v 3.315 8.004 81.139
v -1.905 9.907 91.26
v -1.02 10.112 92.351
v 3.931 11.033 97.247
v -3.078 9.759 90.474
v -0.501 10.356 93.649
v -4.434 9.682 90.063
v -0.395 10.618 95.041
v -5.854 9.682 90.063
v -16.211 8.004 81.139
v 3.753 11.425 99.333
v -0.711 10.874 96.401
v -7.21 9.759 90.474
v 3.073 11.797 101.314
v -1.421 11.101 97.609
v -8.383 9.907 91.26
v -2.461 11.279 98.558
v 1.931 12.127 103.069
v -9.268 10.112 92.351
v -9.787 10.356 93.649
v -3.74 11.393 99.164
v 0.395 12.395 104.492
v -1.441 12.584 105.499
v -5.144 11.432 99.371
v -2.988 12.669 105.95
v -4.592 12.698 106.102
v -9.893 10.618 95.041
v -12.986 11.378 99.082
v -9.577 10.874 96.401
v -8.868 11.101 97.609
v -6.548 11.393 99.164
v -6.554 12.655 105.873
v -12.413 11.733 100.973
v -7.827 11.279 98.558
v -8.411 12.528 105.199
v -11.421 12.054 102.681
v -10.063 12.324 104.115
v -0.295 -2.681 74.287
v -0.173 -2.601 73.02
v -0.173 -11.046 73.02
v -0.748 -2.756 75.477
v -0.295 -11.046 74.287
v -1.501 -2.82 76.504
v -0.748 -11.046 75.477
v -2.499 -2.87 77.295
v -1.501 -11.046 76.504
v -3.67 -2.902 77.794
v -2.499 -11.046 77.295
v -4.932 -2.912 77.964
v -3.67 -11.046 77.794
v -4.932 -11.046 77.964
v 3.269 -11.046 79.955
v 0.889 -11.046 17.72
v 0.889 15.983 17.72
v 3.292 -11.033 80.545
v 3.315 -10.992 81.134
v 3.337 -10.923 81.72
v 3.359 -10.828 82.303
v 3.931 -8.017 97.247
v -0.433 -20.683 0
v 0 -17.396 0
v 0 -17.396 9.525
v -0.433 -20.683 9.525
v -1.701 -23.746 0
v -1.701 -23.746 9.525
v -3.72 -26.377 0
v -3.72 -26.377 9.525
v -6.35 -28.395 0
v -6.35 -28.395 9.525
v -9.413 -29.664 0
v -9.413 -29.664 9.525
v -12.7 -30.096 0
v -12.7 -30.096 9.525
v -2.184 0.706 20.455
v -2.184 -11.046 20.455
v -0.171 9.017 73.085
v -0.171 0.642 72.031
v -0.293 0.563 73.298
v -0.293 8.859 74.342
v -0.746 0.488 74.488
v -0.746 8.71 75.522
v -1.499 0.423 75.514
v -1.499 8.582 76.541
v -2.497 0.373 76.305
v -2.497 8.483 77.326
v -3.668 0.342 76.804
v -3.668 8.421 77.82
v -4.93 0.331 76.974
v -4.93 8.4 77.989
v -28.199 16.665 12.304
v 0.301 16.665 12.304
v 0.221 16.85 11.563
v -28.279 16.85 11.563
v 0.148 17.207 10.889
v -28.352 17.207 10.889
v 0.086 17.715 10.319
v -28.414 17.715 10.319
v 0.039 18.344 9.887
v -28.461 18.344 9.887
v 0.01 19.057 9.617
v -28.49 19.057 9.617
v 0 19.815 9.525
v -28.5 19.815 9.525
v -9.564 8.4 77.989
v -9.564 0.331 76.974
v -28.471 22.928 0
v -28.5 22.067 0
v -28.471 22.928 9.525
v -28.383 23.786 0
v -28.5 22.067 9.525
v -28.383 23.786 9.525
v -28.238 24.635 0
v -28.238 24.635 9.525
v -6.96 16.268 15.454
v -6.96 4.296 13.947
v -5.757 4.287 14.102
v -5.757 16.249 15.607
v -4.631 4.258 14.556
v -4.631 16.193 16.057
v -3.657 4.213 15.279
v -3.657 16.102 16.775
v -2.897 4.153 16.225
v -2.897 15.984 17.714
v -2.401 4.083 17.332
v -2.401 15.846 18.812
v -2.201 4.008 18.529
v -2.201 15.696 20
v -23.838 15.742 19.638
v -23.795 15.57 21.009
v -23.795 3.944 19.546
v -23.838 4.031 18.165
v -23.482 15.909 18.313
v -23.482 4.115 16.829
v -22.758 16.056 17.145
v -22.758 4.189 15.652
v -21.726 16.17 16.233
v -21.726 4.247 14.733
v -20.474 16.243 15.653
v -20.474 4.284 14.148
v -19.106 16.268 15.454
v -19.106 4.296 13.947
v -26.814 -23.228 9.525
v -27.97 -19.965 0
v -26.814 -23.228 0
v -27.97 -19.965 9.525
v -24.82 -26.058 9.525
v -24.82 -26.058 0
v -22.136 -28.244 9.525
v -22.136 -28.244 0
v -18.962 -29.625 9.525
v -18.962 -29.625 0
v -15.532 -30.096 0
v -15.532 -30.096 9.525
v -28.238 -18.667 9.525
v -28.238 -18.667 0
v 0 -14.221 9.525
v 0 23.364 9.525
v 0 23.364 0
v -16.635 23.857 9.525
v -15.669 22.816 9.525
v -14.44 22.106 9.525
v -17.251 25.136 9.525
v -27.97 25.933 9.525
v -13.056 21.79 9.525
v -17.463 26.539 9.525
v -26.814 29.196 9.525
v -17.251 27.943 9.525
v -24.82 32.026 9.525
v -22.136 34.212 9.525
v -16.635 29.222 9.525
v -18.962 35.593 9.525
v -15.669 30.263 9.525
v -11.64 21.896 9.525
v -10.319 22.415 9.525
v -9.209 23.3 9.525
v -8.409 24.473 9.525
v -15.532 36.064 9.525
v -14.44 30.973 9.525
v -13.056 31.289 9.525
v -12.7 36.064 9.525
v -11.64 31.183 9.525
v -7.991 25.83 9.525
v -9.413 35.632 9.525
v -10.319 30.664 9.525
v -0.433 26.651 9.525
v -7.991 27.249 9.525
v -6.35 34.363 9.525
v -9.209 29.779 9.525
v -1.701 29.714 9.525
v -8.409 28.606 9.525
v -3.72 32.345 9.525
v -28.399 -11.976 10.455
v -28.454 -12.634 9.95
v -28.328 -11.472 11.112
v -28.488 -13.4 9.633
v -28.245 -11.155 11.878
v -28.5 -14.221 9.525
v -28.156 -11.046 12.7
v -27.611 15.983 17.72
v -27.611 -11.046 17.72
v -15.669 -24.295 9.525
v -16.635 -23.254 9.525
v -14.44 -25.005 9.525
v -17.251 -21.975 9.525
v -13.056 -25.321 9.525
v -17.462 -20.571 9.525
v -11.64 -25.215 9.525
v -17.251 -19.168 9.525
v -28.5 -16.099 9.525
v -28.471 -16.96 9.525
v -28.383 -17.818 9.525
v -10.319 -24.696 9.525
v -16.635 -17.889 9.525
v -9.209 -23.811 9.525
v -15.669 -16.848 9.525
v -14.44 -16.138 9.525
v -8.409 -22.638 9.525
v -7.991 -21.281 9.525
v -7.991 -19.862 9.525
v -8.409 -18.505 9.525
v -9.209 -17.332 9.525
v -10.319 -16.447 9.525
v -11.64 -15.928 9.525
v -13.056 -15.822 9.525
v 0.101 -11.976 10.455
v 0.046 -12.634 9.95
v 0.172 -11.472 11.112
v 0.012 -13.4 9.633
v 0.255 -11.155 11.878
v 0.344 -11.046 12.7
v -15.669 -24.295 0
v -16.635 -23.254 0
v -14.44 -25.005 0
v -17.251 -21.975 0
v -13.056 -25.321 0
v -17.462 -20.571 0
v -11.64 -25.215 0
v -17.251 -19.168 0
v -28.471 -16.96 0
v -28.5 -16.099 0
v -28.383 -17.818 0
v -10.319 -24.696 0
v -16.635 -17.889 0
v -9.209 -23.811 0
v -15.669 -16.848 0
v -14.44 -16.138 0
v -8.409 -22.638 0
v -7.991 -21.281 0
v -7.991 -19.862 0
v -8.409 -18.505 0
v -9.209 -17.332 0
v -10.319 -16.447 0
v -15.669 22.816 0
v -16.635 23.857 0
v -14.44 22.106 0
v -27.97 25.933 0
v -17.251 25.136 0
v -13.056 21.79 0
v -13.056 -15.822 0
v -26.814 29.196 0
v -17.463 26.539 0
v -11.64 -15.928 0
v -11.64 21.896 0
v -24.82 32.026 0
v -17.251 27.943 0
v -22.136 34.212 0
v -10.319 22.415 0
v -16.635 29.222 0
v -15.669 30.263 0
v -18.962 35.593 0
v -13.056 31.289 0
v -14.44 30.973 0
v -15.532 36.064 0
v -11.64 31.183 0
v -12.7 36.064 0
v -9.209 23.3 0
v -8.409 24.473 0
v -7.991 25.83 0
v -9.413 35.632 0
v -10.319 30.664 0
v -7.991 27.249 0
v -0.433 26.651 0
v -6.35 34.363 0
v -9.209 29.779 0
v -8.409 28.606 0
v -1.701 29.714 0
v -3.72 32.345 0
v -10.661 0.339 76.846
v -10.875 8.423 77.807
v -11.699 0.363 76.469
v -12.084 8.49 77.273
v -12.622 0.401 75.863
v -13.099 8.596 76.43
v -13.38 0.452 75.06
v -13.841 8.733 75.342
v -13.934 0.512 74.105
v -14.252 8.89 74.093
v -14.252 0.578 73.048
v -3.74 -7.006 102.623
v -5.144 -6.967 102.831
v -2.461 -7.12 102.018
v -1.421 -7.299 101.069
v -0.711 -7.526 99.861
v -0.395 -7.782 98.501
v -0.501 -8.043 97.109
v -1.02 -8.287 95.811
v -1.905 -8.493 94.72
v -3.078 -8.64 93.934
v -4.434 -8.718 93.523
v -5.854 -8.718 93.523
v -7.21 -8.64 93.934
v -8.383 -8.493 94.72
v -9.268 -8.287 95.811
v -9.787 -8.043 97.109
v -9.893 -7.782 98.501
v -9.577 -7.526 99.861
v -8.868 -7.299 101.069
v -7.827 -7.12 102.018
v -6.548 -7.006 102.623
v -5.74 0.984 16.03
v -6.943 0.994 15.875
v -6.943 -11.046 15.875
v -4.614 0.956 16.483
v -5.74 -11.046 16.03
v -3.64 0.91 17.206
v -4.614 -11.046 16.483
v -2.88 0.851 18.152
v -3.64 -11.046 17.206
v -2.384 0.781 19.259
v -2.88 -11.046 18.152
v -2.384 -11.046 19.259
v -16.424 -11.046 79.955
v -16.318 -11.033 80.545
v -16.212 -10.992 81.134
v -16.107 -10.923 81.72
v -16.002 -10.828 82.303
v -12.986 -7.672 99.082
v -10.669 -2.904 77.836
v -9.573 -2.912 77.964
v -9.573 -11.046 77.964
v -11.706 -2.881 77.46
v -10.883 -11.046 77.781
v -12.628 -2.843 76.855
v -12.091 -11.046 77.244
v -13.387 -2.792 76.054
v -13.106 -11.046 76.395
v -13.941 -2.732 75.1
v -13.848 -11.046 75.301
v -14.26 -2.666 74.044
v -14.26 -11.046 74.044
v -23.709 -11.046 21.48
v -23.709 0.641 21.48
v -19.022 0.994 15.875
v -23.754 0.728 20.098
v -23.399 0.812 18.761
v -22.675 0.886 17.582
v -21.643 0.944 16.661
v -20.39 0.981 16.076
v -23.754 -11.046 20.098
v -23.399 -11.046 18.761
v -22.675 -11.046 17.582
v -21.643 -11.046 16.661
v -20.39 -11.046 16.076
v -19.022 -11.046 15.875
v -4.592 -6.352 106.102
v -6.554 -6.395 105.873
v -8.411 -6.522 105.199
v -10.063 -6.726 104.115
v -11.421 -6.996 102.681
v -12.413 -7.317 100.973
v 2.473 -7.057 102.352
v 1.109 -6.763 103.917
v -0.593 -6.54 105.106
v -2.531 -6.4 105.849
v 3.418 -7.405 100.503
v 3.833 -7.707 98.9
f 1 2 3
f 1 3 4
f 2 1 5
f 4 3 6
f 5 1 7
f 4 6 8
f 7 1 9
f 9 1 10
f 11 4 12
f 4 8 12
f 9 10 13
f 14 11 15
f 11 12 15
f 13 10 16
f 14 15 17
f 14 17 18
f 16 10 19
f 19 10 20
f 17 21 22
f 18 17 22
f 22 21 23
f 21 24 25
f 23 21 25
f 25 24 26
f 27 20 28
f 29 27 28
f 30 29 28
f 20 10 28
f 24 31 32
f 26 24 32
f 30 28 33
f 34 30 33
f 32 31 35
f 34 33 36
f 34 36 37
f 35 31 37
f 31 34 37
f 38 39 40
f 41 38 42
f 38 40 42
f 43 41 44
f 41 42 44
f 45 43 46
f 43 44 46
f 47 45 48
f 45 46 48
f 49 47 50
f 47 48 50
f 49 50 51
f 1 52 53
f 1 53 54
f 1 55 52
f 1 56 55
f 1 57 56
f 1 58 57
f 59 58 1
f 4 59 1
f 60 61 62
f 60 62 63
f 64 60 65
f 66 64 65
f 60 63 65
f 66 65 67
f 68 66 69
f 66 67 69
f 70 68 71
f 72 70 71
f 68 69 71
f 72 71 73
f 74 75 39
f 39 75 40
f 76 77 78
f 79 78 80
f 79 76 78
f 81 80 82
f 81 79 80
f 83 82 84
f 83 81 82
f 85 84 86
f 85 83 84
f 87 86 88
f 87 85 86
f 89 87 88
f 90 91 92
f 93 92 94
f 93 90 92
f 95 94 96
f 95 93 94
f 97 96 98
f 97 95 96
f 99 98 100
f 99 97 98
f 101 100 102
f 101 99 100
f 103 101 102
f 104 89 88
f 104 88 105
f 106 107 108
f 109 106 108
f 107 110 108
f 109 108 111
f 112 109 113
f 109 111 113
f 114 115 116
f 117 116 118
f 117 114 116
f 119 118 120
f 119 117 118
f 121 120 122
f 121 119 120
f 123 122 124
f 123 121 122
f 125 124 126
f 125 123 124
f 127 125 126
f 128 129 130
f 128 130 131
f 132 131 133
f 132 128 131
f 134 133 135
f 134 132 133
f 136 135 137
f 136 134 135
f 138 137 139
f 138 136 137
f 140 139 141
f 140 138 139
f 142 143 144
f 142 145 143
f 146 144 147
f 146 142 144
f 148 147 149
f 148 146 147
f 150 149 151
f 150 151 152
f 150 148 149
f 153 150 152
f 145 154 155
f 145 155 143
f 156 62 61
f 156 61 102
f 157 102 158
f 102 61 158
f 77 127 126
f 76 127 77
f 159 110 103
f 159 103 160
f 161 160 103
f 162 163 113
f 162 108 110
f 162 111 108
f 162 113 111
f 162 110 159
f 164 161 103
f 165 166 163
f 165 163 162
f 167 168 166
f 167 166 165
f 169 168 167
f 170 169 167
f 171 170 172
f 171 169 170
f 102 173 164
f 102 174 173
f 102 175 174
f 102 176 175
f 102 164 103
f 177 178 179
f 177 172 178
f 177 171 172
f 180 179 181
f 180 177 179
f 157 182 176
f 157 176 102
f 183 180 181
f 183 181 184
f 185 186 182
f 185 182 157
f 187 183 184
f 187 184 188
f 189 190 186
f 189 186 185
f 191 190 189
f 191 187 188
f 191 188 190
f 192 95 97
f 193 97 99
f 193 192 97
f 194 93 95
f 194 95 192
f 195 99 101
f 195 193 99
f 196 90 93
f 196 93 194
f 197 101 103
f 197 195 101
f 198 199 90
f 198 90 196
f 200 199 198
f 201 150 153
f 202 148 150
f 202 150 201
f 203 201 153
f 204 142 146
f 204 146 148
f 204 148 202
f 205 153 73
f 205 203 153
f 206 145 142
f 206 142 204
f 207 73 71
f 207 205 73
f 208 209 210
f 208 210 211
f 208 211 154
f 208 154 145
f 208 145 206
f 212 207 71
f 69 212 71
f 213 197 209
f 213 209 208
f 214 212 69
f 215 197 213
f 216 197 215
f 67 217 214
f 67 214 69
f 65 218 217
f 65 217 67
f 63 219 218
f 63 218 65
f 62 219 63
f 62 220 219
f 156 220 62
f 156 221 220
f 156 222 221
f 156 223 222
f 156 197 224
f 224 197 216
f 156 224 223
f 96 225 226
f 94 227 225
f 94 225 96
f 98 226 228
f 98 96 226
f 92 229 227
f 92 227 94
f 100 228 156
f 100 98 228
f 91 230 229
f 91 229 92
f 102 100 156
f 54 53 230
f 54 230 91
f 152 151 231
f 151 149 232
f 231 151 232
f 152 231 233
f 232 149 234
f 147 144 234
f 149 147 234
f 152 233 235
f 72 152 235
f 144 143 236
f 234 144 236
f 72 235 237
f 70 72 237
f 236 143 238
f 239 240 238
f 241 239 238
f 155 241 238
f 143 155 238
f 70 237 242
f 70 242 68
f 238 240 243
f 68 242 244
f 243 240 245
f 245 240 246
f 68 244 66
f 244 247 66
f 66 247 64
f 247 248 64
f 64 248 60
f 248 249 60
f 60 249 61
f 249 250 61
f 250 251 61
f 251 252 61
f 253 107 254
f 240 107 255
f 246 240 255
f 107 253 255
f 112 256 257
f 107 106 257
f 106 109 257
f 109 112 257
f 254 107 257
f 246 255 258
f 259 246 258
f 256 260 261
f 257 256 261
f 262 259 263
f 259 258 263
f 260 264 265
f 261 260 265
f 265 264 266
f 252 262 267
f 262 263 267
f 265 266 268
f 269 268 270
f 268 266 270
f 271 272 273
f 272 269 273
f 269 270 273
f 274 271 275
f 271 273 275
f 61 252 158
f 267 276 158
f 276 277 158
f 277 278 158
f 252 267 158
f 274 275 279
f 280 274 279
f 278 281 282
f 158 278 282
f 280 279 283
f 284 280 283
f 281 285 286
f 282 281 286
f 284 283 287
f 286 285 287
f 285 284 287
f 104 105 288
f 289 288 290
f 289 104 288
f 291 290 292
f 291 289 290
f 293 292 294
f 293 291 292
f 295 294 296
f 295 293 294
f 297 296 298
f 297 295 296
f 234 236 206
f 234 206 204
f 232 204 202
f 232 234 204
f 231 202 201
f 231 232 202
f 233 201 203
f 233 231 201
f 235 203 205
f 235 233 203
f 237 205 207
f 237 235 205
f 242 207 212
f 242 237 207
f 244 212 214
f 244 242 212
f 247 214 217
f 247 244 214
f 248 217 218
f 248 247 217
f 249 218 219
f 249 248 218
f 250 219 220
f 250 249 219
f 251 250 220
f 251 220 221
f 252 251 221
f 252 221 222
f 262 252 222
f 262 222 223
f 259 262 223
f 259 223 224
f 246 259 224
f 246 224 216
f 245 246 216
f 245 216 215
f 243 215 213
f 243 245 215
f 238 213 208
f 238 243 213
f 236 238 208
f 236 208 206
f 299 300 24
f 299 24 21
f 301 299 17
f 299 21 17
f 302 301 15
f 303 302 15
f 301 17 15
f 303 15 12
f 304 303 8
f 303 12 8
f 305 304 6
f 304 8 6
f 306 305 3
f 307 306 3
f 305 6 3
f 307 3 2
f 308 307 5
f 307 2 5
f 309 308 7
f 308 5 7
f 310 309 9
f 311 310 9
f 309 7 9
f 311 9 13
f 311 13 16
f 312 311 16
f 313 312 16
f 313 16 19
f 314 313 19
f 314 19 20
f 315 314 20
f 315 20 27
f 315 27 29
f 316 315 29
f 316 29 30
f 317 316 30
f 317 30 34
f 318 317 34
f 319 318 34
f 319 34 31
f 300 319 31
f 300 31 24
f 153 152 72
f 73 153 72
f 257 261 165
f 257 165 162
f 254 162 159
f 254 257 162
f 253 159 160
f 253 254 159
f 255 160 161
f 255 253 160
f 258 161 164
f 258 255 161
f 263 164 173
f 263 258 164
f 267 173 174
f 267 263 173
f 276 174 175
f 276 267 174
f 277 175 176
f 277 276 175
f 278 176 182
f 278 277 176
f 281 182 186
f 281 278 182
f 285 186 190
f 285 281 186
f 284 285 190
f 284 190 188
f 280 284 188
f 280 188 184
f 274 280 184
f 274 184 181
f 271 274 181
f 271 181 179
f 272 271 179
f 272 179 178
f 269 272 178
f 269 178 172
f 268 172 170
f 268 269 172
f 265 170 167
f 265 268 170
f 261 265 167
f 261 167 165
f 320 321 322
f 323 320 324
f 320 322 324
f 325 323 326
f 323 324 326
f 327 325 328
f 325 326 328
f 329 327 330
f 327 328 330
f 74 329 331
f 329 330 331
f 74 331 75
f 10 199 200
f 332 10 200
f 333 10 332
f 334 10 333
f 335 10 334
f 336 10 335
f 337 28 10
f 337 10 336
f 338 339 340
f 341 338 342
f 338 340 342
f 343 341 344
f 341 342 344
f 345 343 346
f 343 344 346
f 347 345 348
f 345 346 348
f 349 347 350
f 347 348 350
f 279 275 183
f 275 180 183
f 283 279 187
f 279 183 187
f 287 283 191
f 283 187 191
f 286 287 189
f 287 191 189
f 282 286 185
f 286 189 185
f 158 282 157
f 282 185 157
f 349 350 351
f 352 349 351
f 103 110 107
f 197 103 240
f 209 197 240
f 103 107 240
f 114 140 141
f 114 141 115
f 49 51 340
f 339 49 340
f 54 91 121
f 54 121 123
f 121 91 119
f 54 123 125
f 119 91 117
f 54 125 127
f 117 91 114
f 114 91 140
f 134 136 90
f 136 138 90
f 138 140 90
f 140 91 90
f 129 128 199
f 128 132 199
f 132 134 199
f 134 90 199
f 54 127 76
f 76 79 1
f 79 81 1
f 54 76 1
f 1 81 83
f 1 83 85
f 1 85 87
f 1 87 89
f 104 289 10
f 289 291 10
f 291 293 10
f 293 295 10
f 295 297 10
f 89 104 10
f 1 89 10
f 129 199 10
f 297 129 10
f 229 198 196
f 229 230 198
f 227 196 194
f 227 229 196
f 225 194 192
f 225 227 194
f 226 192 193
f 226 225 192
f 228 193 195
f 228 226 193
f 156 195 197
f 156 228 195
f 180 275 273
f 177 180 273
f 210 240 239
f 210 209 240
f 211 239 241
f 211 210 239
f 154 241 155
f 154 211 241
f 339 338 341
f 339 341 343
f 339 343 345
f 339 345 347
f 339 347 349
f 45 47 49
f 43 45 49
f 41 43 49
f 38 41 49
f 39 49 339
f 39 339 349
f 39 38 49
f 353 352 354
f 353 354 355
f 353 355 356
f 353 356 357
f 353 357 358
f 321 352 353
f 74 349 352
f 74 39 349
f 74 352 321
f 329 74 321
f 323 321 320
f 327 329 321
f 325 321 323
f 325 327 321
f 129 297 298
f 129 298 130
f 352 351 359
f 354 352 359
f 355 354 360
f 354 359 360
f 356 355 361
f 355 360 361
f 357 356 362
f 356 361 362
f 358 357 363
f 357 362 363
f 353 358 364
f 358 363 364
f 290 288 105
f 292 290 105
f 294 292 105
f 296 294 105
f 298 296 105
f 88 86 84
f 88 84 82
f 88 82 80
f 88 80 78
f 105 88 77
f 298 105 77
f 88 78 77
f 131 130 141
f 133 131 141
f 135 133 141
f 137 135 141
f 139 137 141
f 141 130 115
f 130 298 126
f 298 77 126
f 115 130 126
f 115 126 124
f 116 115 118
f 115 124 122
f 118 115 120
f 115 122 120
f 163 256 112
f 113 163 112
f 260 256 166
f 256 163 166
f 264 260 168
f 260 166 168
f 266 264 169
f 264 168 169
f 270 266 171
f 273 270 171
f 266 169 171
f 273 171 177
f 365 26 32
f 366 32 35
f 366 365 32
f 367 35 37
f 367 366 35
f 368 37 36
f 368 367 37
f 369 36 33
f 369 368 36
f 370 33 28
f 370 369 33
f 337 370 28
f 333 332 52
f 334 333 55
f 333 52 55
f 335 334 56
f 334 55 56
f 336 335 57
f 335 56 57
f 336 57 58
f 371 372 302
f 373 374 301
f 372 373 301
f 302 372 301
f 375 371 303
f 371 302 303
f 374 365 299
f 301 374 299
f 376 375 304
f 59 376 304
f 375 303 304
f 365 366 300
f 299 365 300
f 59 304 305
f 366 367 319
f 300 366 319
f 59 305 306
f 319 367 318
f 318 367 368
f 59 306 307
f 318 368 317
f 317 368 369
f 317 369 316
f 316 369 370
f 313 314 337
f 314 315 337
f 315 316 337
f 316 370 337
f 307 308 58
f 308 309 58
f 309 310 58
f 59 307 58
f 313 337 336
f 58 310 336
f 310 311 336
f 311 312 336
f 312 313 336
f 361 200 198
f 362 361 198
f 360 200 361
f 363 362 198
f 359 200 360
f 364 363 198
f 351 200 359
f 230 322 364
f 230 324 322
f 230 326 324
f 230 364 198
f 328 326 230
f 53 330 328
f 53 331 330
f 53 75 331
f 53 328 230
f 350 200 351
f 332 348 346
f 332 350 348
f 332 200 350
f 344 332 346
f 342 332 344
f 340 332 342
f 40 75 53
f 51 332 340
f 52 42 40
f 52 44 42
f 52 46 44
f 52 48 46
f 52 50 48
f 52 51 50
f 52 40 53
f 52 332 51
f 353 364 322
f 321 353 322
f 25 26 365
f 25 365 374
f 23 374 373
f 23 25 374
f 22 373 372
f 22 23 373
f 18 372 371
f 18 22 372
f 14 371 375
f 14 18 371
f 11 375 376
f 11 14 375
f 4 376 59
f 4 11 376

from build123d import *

# Parameters (mm, degrees)
SKETCH1_R           = 4.762499999999989
SKETCH1_R_2         = 4.762500000000005
BOSS_EXTRUDE1_DEPTH = 9.525
CHAMFER1_SIZE       = 88.89999999999999
CHAMFER1_SIZE2      = 6.20588556630559
CHAMFER2_SIZE       = 88.89999999999999
CHAMFER2_SIZE2      = 6.300746042301969
FILLET1_R           = 8.528649
CUT_EXTRUDE2_DEPTH  = 117.6635246642072
FILLET4_R           = 3.175
CUT_EXTRUDE3_REACH  = 119.909
FILLET5_R           = 12.7
FILLET6_R           = 12.7
SKETCH15_R          = 4.7624999999999975
CUT_EXTRUDE7_DEPTH  = 117.82072113018388
FILLET9_R           = 12.7
CUT_EXTRUDE8_REACH  = 121.538
FILLET10_R          = 12.7


with BuildPart() as part:
    # Sketch1 → Boss-Extrude1 (new body)
    # profile 1 of 3: a face of its own
    with BuildSketch(Plane.XY):
        Polygon((-28.50000000000001, 23.36447913627793), (-28.500000000000007, 17.01447913627793), (-1.421e-14, 17.01447913627793), (-1.388e-14, 36.06447913627791), (-25.877441230163292, 36.06447913627793), align=None)
        with Locations(Location((-12.700000000000017, 26.539479136277926, 0), (0, 0, 180))):
            Circle(SKETCH1_R, mode=Mode.SUBTRACT)
    # profile 2 of 3: a face of its own
    with BuildSketch(Plane.XY):
        Polygon((1.421e-14, -11.046434023496033), (-28.499999999999996, -11.046434023496033), (-28.499999999999996, -17.396434023496035), (-25.877441230163278, -30.09643402349603), (1.421e-14, -30.09643402349603), align=None)
        with Locations(Location((-12.699999999999989, -20.571434023496032, 0), (0, 0, 180))):
            Circle(SKETCH1_R_2, mode=Mode.SUBTRACT)
    # profile 3 of 3: a face of its own
    with BuildSketch(Plane.XY):
        Polygon((-28.500000000000007, 17.01447913627793), (-28.5, -11.046434023496033), (1.421e-14, -11.046434023496033), (-5.89e-15, 17.014479136277927), align=None)
    extrude(amount=BOSS_EXTRUDE1_DEPTH)

    # Sweep1: sweep along a path in Sketch4
    with BuildLine(Plane(origin=(0, -11.046434023496033, 0), x_dir=(1, 0, 0), z_dir=(0, 1, 0))) as sweep1_path:
        Line((-14.249999999999991, -9.525), (-5.144041152540681, -93.4757286489478))
        Line((-5.144041152540681, -93.4757286489478), (-3.7745316583277084, -106.10167193035296))
    # Sketch3 → Sweep1 (sweep)
    with BuildSketch(Plane.XY.offset(9.525)):
        Polygon((-28.499999999999996, -11.046434023496033), (1.388e-14, -11.046434023496033), (-1.388e-14, 17.01447913627793), (-28.50000000000001, 17.01447913627793), align=None)
    sweep(path=sweep1_path.line)

    # Chamfer1
    chamfer1_edges = [part.edges().sort_by_distance(p)[0] for p in [
        (10.475468341672286, 2.9840225563909506, 106.10167193035296),
    ]]
    chamfer1_side = [part.faces().sort_by_distance(p)[0] for p in [
        (5.237734170836156, 2.9840225563909497, 57.813335965176485),
    ]]
    chamfer(chamfer1_edges, length=CHAMFER1_SIZE, length2=CHAMFER1_SIZE2, reference=chamfer1_side[0])

    # Chamfer2
    chamfer2_edges = [part.edges().sort_by_distance(p)[0] for p in [
        (-18.02453165832772, 2.984022556390949, 106.10167193035296),
    ]]
    chamfer2_side = [part.faces().sort_by_distance(p)[0] for p in [
        (-23.26226582916385, 2.9840225563909497, 57.813335965176506),
    ]]
    chamfer(chamfer2_edges, length=CHAMFER2_SIZE, length2=CHAMFER2_SIZE2, reference=chamfer2_side[0])

    # Fillet1
    fillet1_edges = [part.edges().sort_by_distance(p)[0] for p in [
        (4.269582775366721, 2.984022556390949, 106.10167193035296),
        (-11.72378561602573, 2.984022556390949, 106.10167193035296),
    ]]
    fillet(fillet1_edges, radius=FILLET1_R)

    # Sketch6 → Cut-Extrude2 (cut, through all)
    with BuildSketch(Plane.ZY.offset(28.500000000000004)):
        Polygon((81.13920097504592, 8.003565976503973), (106.10167193035296, 12.697715932081872), (106.10167193035296, -6.352284067918128), (81.13920097504591, -11.046434023496026), (117.96042684070639, -22.85606140259037), (128.32769329374543, 30.37810454166645), (17.720068960516624, 36.90132837728653), (9.525, 17.01447913627794), align=None)
    extrude(amount=-CUT_EXTRUDE2_DEPTH, mode=Mode.SUBTRACT)

    # Fillet4
    fillet4_edges = [part.edges().sort_by_distance(p)[0] for p in [
        (-14.249999999999995, -11.046434023496033, 9.525),
        (-14.25000000000001, 17.01447913627793, 9.525),
    ]]
    fillet(fillet4_edges, radius=FILLET4_R)

    # Cut-Extrude3: up to this plane
    cut_extrude3_end = Plane(origin=(-1.02e-15, 5.153508696821327, 0.3242221424168255), z_dir=(0, -0.9980268393792456, -0.06278875598921893))
    # Sketch8 → Cut-Extrude3 (cut, up to the surface)
    with BuildSketch(Plane(origin=(-6.1e-15, 17.929113719354145, 2.255944834364728), x_dir=(1, 3.4e-16, 4e-17), z_dir=(0, 0.9921767086467868, 0.12484141467810073)), mode=Mode.PRIVATE) as cut_extrude3_sk1:
        with BuildLine():
            ThreePointArc((-6.960254723021977, -13.301909437066078), (-3.6571329134227537, -14.633550570696002), (-2.2011808134518622, -17.88379445084032))
            Line((-2.2011808134518622, -17.88379445084032), (-0.1706376662483526, -71.38713388044914))
            ThreePointArc((-0.1706376662483526, -71.38713388044914), (-1.4988527094483572, -74.87087067627415), (-4.929711575818469, -76.33024886667496))
            Line((-4.929711575818469, -76.33024886667496), (-9.56390547472291, -76.33024886667496))
            ThreePointArc((-9.56390547472291, -76.33024886667496), (-12.621598981127008, -75.21903859372955), (-14.252419863558515, -72.40395403030512))
            Line((-14.252419863558515, -72.40395403030512), (-23.79483884579154, -18.9006146006963))
            ThreePointArc((-23.79483884579154, -18.9006146006963), (-22.75761418401056, -15.006715930662008), (-19.10632445695593, -13.301909437066078))
            Line((-19.10632445695593, -13.301909437066078), (-6.960254723021977, -13.301909437066078))
        make_face()
    cut_extrude3_tool1 = split(extrude(cut_extrude3_sk1.sketch, amount=-CUT_EXTRUDE3_REACH, mode=Mode.PRIVATE), bisect_by=cut_extrude3_end, keep=Keep.BOTH, mode=Mode.PRIVATE)
    add(cut_extrude3_tool1.solids().sort_by_distance((-10.437775, 12.651733, 44.197908))[0], mode=Mode.SUBTRACT)

    # Fillet5
    fillet5_edges = [part.edges().sort_by_distance(p)[0] for p in [
        (-28.50000000000001, 23.36447913627793, 4.7625),
    ]]
    fillet(fillet5_edges, radius=FILLET5_R)

    # Fillet6
    fillet6_edges = [part.edges().sort_by_distance(p)[0] for p in [
        (-1.404e-14, 36.06447913627791, 4.7625),
        (-25.877441230163292, 36.06447913627793, 4.7625),
    ]]
    fillet(fillet6_edges, radius=FILLET6_R)

    # Sketch15 → Cut-Extrude7 (cut, through all)
    with BuildSketch(Plane(origin=(2.39e-15, -7.006748203781874, 1.317607012078891), x_dir=(1, 3.3e-16, -6e-17), z_dir=(0, 0.9827744470593327, -0.18480905336920886))):
        with Locations(Location((-5.144041152540709, -95.00998731918351, 0), (0, 0, 270))):
            Circle(SKETCH15_R)
    extrude(amount=-CUT_EXTRUDE7_DEPTH, mode=Mode.SUBTRACT)

    # Fillet9
    fillet9_edges = [part.edges().sort_by_distance(p)[0] for p in [
        (1.404e-14, -30.09643402349603, 4.7625),
        (-25.877441230163278, -30.09643402349603, 4.7625),
        (-28.499999999999996, -17.396434023496035, 4.7625),
    ]]
    fillet(fillet9_edges, radius=FILLET9_R)

    # Cut-Extrude8: up to this plane
    cut_extrude8_end = Plane(origin=(-3.9e-16, 1.9847734817922233, 0.12486784215105542), z_dir=(0, -0.9980268393792456, -0.06278875598921893))
    # Sketch16 → Cut-Extrude8 (cut, up to the surface)
    with BuildSketch(Plane.XZ.offset(11.046434023496033), mode=Mode.PRIVATE) as cut_extrude8_sk1:
        with BuildLine():
            Line((-19.021943533629052, 15.875), (-6.942808285990063, 15.874999999999996))
            ThreePointArc((-6.942808285990063, 15.874999999999996), (-3.6401991085921965, 17.206147661436145), (-2.183788559280739, 20.455462941157986))
            Line((-2.183788559280739, 20.455462941157986), (-0.17315756899978269, 73.01966391620381))
            ThreePointArc((-0.17315756899978269, 73.01966391620381), (-1.5008249571452126, 76.50431015244372), (-4.932177295709103, 77.9642009750459))
            Line((-4.932177295709103, 77.9642009750459), (-9.573100570431755, 77.9642009750459))
            ThreePointArc((-9.573100570431755, 77.9642009750459), (-12.628305718550124, 76.85507308214247), (-14.260471182334522, 74.04429399464112))
            Line((-14.260471182334522, 74.04429399464112), (-23.709314145531817, 21.480093019595273))
            ThreePointArc((-23.709314145531817, 21.480093019595273), (-22.67531564072565, 17.582294851881656), (-19.021943533629052, 15.875))
        make_face()
    cut_extrude8_tool1 = split(extrude(cut_extrude8_sk1.sketch, amount=-CUT_EXTRUDE8_REACH, mode=Mode.PRIVATE), bisect_by=cut_extrude8_end, keep=Keep.BOTH, mode=Mode.PRIVATE)
    add(cut_extrude8_tool1.solids().sort_by_distance((-10.411854, -11.046434, 44.429711))[0], mode=Mode.SUBTRACT)

    # Fillet10
    fillet10_edges = [part.edges().sort_by_distance(p)[0] for p in [
        (-6.448124287799661, -11.046434023496028, 81.13920097504591),
    ]]
    fillet(fillet10_edges, radius=FILLET10_R)


solid = part.part
